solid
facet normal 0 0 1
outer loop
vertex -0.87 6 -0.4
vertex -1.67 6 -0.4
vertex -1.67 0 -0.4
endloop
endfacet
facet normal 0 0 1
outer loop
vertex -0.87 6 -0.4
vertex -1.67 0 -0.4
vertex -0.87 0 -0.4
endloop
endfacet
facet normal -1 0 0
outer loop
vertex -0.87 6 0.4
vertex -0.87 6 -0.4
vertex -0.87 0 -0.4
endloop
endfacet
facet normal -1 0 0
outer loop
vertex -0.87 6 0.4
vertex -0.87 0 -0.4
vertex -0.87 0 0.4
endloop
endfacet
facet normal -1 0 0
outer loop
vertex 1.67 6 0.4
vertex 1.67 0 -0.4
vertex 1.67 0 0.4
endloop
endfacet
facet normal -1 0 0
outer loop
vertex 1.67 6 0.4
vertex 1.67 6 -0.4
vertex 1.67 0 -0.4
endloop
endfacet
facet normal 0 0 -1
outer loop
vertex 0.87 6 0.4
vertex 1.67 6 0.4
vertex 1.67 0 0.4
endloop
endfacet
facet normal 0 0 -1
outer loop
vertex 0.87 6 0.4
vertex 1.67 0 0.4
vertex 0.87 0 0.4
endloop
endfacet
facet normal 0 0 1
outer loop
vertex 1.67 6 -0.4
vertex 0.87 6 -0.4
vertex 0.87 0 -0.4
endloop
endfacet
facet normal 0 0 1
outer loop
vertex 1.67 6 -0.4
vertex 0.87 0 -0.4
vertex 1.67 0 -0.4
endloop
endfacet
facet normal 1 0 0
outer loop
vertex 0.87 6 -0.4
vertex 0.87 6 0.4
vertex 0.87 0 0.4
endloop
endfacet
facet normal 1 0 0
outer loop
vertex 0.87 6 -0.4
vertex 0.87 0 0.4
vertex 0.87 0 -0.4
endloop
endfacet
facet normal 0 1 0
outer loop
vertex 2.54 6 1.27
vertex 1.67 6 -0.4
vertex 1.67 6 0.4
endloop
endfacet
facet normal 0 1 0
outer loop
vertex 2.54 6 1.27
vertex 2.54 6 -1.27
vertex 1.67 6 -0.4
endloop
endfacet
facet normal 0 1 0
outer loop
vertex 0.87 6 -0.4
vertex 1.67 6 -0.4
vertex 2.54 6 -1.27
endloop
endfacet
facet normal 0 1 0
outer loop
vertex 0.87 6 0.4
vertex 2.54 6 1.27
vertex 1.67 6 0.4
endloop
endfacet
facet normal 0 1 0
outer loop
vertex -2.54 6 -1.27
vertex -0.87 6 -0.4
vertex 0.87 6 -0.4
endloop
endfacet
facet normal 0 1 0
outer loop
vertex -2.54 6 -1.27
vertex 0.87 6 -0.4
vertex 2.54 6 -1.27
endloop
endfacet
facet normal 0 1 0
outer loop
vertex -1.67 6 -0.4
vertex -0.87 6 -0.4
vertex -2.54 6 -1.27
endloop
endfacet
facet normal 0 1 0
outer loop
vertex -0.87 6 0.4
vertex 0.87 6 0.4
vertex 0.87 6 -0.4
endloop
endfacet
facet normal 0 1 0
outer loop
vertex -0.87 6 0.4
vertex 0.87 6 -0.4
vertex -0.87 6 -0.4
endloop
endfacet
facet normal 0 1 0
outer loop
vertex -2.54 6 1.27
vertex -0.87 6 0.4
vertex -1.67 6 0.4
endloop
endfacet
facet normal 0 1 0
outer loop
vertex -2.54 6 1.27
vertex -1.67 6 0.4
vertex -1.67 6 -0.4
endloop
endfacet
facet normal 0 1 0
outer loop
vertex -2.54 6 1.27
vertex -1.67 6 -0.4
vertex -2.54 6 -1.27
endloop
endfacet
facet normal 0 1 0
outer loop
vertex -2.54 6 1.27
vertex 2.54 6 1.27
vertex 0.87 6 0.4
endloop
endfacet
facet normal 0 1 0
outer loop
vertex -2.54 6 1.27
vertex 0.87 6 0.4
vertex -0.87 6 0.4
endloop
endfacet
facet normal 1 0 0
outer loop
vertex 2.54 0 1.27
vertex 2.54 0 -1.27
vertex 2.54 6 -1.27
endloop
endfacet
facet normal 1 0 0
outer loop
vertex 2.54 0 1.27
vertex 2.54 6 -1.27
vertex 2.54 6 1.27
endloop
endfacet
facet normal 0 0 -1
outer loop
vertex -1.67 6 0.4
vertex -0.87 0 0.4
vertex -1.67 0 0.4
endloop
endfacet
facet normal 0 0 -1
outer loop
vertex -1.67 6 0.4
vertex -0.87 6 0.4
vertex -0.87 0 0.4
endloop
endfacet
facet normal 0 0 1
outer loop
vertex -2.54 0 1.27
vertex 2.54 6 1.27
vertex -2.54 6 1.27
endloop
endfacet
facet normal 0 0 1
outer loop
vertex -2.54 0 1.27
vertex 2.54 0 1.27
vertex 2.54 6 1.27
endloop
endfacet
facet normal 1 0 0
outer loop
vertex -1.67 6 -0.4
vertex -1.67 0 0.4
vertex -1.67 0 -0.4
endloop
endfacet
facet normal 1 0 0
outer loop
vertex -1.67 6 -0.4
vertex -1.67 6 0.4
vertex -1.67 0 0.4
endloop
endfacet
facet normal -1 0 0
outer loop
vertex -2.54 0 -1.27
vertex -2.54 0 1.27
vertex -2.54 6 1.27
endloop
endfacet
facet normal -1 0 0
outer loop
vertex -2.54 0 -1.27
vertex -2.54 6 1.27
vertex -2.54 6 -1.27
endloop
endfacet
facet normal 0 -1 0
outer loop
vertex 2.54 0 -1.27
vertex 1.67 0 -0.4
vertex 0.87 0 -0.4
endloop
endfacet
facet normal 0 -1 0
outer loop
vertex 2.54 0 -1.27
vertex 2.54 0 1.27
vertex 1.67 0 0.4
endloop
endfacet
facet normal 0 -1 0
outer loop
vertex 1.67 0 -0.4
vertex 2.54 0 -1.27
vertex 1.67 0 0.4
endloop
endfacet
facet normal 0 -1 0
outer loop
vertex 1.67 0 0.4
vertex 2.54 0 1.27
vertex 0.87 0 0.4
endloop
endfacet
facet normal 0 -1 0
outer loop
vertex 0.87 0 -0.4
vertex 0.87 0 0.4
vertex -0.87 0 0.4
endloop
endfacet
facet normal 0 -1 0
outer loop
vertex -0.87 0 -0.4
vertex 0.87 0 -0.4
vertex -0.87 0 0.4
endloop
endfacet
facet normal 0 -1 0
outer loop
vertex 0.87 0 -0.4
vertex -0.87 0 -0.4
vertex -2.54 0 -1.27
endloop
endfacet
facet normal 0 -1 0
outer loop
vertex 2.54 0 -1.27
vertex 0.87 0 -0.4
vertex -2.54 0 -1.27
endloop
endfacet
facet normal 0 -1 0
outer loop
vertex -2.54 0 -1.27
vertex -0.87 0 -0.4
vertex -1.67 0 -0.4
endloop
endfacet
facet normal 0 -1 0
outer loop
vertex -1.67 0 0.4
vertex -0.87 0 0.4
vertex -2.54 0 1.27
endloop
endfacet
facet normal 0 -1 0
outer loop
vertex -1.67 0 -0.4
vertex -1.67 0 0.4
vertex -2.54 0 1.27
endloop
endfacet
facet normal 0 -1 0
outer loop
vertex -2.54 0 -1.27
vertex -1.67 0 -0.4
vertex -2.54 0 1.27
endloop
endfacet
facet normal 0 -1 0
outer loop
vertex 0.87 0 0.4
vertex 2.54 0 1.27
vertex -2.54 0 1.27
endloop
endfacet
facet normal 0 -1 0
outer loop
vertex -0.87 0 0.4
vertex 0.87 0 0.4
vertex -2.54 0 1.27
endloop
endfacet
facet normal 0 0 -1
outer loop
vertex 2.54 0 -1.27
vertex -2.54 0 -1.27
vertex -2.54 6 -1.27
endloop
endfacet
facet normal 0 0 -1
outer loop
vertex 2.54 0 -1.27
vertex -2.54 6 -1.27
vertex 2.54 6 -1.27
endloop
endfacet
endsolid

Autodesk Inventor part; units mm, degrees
ref_plane "YZ Plane" through (0, 0, 0) normal (1, 0, 0) x (0, 1, 0)
ref_plane "XZ Plane" through (0, 0, 0) normal (0, 1, 0) x (-1, 0, 0)
ref_plane "XY Plane" through (0, 0, 0) normal (0, 0, 1) x (1, 0, 0)
sketch "Эскиз1" plane through (0, 0, 0) normal (0, 1, 0) x (-1, 0, 0)
  line L0 (2.54, -1.27) -> (-2.54, -1.27)
  line L1 (-2.54, -1.27) -> (-2.54, 1.27)
  line L2 (-2.54, 1.27) -> (2.54, 1.27)
  line L3 (2.54, 1.27) -> (2.54, -1.27)
  line L4 (0, -1.778) -> (0, 1.778) projected
  line L5 (3.556, 0) -> (-3.556, 0) projected
  point P0 (0, 0)
  dimension "d0" = 5.08
  dimension "d1" = 2.54
extrude "Выдавливание1" add sketch "Эскиз1" along normal blind 6
sketch "Эскиз2" plane through (0, 6, 0) normal (0, 1, 0) x (1, 0, 0)
  line L0 (-1.67, 0.4) -> (-0.87, 0.4)
  line L1 (-0.87, 0.4) -> (-0.87, -0.4)
  line L2 (-0.87, -0.4) -> (-1.67, -0.4)
  line L3 (-1.67, -0.4) -> (-1.67, 0.4)
  line L4 (-3.556, 0) -> (3.556, 0) projected
  line L5 (0, 1.778) -> (0, -1.778) projected
  line L6 (0.87, 0.4) -> (1.67, 0.4)
  line L7 (1.67, 0.4) -> (1.67, -0.4)
  line L8 (1.67, -0.4) -> (0.87, -0.4)
  line L9 (0.87, -0.4) -> (0.87, 0.4)
  point P0 (0, 0)
  dimension "d4" = 0.8
  dimension "d5" = 0.8
  dimension "d8" = 2.54
extrude "Выдавливание2" cut sketch "Эскиз2" against normal blind 6
properties part number "jumper"
